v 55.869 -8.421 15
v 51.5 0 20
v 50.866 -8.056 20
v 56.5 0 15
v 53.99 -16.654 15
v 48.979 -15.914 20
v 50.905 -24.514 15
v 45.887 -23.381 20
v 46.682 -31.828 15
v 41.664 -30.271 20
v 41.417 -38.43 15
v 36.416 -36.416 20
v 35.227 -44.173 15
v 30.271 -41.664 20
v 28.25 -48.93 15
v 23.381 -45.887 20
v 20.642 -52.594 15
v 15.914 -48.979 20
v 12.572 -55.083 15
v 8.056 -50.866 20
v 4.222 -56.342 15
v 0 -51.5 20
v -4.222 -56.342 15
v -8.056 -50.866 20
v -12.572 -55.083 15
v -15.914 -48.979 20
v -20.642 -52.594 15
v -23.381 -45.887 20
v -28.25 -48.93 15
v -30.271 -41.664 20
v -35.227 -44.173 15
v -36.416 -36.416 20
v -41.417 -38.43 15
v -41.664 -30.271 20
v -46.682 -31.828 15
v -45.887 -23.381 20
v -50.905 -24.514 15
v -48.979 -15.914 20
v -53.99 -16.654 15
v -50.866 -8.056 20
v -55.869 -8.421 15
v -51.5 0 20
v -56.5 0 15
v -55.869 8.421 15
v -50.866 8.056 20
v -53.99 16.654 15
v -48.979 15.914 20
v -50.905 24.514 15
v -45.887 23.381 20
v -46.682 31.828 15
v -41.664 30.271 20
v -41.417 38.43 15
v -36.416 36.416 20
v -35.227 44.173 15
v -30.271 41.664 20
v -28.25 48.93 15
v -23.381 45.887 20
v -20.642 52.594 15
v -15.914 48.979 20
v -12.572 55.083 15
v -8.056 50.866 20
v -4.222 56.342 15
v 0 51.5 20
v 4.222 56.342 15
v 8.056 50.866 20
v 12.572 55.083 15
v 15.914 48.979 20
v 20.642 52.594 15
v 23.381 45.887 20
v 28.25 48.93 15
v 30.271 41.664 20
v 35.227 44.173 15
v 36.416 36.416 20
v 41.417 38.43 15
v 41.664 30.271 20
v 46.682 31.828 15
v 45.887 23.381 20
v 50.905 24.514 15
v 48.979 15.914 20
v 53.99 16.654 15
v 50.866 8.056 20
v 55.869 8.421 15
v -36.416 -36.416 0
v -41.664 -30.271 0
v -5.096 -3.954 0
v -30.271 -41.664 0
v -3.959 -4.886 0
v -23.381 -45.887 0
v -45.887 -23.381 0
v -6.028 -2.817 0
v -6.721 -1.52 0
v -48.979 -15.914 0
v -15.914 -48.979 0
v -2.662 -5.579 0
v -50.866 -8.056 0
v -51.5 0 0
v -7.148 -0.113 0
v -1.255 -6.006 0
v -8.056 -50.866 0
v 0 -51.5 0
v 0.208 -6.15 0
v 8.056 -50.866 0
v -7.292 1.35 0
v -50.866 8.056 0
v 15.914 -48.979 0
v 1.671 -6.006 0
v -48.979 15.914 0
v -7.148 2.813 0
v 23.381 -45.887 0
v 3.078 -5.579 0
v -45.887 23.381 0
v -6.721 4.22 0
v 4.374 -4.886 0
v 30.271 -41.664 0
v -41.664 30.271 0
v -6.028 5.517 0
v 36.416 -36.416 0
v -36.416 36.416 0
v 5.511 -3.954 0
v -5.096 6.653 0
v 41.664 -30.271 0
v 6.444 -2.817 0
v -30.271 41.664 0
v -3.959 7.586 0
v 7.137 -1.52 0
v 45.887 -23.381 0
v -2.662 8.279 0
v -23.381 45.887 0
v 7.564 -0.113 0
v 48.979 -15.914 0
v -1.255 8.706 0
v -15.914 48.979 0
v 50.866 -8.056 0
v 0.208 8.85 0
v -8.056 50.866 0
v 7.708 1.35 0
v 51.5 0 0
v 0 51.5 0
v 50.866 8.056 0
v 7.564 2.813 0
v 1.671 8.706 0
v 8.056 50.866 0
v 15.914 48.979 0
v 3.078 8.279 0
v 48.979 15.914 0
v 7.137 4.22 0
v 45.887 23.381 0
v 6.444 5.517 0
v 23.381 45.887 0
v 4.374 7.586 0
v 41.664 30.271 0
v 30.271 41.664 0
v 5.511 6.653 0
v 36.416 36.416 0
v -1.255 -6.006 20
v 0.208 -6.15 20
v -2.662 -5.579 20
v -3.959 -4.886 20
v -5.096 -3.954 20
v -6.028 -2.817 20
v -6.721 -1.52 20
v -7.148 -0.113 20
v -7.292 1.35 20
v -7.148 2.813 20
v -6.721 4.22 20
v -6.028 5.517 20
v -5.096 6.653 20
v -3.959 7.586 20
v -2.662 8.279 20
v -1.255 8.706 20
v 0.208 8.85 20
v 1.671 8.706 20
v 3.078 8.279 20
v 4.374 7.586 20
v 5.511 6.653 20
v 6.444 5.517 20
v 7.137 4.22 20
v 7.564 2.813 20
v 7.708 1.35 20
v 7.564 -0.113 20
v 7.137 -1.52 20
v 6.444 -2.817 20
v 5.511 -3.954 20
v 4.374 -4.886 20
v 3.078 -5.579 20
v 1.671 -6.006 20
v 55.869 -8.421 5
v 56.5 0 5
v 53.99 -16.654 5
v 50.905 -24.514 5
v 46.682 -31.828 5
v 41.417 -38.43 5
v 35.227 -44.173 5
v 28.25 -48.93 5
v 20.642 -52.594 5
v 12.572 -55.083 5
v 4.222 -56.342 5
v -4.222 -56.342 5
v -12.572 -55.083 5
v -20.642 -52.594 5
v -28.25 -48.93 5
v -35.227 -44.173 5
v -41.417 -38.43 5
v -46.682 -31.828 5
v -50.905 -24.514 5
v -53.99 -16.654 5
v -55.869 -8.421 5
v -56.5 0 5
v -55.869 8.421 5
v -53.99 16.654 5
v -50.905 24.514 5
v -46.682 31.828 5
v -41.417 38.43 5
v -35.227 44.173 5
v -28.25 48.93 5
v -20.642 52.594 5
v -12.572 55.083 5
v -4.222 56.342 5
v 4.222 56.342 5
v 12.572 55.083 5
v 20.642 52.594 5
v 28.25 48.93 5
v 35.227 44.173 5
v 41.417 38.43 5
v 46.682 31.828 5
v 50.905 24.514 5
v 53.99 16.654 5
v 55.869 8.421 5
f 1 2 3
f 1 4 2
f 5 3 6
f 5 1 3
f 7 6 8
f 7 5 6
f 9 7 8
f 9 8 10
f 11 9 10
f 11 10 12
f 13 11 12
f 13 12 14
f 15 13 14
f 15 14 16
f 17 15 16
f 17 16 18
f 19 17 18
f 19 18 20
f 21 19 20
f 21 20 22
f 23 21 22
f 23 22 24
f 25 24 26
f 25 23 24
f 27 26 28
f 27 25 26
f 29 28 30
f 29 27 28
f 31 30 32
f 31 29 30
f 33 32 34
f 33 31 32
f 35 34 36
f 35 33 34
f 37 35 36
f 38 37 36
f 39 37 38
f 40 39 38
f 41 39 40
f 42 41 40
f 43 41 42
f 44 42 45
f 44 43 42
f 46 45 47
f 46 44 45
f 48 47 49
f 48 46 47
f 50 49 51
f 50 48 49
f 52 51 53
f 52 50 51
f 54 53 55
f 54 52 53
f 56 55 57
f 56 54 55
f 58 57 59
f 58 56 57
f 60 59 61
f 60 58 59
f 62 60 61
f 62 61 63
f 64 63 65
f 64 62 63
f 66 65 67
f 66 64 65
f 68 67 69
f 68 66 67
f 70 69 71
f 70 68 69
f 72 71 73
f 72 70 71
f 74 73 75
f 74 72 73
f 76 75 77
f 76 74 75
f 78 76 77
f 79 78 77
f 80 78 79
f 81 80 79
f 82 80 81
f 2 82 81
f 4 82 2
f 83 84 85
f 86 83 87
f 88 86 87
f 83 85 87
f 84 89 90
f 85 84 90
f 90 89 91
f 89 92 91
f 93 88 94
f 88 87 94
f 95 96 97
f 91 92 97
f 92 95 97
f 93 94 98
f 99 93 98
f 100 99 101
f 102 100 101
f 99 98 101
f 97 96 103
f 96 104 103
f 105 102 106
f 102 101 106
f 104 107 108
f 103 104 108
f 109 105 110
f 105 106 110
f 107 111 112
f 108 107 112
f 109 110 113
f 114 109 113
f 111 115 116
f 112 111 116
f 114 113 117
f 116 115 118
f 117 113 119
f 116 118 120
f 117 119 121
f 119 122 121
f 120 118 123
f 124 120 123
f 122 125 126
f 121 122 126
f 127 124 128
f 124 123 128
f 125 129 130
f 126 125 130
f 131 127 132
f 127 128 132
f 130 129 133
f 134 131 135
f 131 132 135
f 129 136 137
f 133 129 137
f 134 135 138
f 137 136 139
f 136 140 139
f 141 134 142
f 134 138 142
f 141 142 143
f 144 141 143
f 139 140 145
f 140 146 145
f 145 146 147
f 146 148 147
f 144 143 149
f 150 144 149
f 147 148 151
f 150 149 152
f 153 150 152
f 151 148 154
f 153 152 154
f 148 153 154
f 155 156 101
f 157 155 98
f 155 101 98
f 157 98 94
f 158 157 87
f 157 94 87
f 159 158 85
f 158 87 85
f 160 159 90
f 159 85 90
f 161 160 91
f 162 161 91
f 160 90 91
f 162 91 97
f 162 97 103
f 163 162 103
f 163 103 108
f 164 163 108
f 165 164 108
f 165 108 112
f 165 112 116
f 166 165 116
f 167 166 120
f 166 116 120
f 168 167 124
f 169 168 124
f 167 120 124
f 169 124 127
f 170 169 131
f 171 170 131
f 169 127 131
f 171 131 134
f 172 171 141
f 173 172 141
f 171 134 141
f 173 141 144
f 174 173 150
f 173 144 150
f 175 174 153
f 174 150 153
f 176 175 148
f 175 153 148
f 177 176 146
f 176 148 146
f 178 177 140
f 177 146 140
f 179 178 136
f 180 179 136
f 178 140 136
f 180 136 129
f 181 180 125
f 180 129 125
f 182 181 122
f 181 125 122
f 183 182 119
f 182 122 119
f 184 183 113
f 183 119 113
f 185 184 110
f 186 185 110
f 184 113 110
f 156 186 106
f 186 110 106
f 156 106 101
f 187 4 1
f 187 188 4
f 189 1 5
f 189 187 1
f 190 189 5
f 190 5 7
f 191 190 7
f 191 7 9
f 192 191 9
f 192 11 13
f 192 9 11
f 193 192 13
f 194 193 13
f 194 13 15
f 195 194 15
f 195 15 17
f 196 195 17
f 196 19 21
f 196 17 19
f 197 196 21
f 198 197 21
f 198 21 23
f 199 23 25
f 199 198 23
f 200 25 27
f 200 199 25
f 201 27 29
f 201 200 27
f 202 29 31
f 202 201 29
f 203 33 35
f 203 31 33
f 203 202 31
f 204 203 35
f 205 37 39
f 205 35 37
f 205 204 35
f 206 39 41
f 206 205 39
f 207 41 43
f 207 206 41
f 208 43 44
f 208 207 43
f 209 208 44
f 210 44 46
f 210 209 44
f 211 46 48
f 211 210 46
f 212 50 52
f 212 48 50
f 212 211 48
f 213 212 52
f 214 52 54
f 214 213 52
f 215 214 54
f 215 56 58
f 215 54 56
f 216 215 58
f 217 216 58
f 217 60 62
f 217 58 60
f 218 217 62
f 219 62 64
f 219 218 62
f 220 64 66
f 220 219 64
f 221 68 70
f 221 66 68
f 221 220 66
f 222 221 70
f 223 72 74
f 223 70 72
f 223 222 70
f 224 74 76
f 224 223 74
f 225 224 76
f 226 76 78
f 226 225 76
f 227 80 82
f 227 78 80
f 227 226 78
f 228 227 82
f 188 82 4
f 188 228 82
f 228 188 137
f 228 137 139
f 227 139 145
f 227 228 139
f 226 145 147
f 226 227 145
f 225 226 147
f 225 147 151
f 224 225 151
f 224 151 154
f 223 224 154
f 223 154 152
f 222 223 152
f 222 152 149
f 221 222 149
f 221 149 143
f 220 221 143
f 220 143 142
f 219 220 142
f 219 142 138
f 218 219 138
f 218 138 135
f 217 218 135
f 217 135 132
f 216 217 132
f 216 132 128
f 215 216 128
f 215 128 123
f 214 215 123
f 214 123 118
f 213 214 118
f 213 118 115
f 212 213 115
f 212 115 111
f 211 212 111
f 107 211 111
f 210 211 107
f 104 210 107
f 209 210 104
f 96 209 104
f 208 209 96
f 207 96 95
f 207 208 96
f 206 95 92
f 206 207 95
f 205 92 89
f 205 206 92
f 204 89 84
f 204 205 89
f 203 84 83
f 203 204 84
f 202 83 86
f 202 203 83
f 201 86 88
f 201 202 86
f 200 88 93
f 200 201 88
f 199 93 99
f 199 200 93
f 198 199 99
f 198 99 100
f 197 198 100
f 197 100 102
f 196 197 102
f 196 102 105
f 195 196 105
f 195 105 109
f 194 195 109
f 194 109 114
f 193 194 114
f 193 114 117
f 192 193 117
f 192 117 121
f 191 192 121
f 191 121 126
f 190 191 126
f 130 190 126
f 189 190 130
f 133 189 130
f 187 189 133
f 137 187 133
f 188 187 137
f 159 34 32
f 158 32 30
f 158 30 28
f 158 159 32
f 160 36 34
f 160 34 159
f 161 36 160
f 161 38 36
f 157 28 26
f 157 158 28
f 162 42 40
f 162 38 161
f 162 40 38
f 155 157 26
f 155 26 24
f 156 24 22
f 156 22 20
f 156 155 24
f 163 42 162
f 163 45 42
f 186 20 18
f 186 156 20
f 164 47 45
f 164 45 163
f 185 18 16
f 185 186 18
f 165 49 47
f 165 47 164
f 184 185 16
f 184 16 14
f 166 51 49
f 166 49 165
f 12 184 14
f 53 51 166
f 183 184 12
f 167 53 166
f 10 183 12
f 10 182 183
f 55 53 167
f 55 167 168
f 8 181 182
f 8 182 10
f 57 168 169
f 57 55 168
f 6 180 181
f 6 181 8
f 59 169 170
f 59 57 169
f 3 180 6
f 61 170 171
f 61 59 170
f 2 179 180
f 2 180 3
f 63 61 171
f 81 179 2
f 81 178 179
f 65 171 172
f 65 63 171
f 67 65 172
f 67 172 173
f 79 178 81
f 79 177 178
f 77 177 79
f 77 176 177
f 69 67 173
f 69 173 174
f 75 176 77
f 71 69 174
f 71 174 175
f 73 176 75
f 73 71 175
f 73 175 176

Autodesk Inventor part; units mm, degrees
ref_plane "YZ Plane" through (0, 0, 0) normal (1, 0, 0) x (0, 1, 0)
ref_plane "XZ Plane" through (0, 0, 0) normal (0, 1, 0) x (-1, 0, 0)
ref_plane "XY Plane" through (0, 0, 0) normal (0, 0, 1) x (1, 0, 0)
sketch "Sketch1" plane through (0, 0, 0) normal (0, 0, 1) x (1, 0, 0)
  circle A0 centre (0, 0) radius 56.5
  dimension "d0" = 113
extrude "Extrusion1" add sketch "Sketch1" along normal blind 20
thread "Thread1" size "M115x6" class "6g" standard "ANSI Metric M Profile" full length
chamfer "Chamfer1" distance 5 angle 45 2 edges at (-56.5, 0, 20) (-56.5, 0, 0)
sketch "Sketch2" plane through (0, 0, 20) normal (0, 0, 1) x (1, 0, 0)
  point P0 (0, 0)
  point P1 (0.2077, 1.3498)
hole "Hole1" at (0.2077, 1.3498, 20) direction (0, 0, -1) diameter 15 depth 20 tip angle 118
properties part number "new_encoder"
